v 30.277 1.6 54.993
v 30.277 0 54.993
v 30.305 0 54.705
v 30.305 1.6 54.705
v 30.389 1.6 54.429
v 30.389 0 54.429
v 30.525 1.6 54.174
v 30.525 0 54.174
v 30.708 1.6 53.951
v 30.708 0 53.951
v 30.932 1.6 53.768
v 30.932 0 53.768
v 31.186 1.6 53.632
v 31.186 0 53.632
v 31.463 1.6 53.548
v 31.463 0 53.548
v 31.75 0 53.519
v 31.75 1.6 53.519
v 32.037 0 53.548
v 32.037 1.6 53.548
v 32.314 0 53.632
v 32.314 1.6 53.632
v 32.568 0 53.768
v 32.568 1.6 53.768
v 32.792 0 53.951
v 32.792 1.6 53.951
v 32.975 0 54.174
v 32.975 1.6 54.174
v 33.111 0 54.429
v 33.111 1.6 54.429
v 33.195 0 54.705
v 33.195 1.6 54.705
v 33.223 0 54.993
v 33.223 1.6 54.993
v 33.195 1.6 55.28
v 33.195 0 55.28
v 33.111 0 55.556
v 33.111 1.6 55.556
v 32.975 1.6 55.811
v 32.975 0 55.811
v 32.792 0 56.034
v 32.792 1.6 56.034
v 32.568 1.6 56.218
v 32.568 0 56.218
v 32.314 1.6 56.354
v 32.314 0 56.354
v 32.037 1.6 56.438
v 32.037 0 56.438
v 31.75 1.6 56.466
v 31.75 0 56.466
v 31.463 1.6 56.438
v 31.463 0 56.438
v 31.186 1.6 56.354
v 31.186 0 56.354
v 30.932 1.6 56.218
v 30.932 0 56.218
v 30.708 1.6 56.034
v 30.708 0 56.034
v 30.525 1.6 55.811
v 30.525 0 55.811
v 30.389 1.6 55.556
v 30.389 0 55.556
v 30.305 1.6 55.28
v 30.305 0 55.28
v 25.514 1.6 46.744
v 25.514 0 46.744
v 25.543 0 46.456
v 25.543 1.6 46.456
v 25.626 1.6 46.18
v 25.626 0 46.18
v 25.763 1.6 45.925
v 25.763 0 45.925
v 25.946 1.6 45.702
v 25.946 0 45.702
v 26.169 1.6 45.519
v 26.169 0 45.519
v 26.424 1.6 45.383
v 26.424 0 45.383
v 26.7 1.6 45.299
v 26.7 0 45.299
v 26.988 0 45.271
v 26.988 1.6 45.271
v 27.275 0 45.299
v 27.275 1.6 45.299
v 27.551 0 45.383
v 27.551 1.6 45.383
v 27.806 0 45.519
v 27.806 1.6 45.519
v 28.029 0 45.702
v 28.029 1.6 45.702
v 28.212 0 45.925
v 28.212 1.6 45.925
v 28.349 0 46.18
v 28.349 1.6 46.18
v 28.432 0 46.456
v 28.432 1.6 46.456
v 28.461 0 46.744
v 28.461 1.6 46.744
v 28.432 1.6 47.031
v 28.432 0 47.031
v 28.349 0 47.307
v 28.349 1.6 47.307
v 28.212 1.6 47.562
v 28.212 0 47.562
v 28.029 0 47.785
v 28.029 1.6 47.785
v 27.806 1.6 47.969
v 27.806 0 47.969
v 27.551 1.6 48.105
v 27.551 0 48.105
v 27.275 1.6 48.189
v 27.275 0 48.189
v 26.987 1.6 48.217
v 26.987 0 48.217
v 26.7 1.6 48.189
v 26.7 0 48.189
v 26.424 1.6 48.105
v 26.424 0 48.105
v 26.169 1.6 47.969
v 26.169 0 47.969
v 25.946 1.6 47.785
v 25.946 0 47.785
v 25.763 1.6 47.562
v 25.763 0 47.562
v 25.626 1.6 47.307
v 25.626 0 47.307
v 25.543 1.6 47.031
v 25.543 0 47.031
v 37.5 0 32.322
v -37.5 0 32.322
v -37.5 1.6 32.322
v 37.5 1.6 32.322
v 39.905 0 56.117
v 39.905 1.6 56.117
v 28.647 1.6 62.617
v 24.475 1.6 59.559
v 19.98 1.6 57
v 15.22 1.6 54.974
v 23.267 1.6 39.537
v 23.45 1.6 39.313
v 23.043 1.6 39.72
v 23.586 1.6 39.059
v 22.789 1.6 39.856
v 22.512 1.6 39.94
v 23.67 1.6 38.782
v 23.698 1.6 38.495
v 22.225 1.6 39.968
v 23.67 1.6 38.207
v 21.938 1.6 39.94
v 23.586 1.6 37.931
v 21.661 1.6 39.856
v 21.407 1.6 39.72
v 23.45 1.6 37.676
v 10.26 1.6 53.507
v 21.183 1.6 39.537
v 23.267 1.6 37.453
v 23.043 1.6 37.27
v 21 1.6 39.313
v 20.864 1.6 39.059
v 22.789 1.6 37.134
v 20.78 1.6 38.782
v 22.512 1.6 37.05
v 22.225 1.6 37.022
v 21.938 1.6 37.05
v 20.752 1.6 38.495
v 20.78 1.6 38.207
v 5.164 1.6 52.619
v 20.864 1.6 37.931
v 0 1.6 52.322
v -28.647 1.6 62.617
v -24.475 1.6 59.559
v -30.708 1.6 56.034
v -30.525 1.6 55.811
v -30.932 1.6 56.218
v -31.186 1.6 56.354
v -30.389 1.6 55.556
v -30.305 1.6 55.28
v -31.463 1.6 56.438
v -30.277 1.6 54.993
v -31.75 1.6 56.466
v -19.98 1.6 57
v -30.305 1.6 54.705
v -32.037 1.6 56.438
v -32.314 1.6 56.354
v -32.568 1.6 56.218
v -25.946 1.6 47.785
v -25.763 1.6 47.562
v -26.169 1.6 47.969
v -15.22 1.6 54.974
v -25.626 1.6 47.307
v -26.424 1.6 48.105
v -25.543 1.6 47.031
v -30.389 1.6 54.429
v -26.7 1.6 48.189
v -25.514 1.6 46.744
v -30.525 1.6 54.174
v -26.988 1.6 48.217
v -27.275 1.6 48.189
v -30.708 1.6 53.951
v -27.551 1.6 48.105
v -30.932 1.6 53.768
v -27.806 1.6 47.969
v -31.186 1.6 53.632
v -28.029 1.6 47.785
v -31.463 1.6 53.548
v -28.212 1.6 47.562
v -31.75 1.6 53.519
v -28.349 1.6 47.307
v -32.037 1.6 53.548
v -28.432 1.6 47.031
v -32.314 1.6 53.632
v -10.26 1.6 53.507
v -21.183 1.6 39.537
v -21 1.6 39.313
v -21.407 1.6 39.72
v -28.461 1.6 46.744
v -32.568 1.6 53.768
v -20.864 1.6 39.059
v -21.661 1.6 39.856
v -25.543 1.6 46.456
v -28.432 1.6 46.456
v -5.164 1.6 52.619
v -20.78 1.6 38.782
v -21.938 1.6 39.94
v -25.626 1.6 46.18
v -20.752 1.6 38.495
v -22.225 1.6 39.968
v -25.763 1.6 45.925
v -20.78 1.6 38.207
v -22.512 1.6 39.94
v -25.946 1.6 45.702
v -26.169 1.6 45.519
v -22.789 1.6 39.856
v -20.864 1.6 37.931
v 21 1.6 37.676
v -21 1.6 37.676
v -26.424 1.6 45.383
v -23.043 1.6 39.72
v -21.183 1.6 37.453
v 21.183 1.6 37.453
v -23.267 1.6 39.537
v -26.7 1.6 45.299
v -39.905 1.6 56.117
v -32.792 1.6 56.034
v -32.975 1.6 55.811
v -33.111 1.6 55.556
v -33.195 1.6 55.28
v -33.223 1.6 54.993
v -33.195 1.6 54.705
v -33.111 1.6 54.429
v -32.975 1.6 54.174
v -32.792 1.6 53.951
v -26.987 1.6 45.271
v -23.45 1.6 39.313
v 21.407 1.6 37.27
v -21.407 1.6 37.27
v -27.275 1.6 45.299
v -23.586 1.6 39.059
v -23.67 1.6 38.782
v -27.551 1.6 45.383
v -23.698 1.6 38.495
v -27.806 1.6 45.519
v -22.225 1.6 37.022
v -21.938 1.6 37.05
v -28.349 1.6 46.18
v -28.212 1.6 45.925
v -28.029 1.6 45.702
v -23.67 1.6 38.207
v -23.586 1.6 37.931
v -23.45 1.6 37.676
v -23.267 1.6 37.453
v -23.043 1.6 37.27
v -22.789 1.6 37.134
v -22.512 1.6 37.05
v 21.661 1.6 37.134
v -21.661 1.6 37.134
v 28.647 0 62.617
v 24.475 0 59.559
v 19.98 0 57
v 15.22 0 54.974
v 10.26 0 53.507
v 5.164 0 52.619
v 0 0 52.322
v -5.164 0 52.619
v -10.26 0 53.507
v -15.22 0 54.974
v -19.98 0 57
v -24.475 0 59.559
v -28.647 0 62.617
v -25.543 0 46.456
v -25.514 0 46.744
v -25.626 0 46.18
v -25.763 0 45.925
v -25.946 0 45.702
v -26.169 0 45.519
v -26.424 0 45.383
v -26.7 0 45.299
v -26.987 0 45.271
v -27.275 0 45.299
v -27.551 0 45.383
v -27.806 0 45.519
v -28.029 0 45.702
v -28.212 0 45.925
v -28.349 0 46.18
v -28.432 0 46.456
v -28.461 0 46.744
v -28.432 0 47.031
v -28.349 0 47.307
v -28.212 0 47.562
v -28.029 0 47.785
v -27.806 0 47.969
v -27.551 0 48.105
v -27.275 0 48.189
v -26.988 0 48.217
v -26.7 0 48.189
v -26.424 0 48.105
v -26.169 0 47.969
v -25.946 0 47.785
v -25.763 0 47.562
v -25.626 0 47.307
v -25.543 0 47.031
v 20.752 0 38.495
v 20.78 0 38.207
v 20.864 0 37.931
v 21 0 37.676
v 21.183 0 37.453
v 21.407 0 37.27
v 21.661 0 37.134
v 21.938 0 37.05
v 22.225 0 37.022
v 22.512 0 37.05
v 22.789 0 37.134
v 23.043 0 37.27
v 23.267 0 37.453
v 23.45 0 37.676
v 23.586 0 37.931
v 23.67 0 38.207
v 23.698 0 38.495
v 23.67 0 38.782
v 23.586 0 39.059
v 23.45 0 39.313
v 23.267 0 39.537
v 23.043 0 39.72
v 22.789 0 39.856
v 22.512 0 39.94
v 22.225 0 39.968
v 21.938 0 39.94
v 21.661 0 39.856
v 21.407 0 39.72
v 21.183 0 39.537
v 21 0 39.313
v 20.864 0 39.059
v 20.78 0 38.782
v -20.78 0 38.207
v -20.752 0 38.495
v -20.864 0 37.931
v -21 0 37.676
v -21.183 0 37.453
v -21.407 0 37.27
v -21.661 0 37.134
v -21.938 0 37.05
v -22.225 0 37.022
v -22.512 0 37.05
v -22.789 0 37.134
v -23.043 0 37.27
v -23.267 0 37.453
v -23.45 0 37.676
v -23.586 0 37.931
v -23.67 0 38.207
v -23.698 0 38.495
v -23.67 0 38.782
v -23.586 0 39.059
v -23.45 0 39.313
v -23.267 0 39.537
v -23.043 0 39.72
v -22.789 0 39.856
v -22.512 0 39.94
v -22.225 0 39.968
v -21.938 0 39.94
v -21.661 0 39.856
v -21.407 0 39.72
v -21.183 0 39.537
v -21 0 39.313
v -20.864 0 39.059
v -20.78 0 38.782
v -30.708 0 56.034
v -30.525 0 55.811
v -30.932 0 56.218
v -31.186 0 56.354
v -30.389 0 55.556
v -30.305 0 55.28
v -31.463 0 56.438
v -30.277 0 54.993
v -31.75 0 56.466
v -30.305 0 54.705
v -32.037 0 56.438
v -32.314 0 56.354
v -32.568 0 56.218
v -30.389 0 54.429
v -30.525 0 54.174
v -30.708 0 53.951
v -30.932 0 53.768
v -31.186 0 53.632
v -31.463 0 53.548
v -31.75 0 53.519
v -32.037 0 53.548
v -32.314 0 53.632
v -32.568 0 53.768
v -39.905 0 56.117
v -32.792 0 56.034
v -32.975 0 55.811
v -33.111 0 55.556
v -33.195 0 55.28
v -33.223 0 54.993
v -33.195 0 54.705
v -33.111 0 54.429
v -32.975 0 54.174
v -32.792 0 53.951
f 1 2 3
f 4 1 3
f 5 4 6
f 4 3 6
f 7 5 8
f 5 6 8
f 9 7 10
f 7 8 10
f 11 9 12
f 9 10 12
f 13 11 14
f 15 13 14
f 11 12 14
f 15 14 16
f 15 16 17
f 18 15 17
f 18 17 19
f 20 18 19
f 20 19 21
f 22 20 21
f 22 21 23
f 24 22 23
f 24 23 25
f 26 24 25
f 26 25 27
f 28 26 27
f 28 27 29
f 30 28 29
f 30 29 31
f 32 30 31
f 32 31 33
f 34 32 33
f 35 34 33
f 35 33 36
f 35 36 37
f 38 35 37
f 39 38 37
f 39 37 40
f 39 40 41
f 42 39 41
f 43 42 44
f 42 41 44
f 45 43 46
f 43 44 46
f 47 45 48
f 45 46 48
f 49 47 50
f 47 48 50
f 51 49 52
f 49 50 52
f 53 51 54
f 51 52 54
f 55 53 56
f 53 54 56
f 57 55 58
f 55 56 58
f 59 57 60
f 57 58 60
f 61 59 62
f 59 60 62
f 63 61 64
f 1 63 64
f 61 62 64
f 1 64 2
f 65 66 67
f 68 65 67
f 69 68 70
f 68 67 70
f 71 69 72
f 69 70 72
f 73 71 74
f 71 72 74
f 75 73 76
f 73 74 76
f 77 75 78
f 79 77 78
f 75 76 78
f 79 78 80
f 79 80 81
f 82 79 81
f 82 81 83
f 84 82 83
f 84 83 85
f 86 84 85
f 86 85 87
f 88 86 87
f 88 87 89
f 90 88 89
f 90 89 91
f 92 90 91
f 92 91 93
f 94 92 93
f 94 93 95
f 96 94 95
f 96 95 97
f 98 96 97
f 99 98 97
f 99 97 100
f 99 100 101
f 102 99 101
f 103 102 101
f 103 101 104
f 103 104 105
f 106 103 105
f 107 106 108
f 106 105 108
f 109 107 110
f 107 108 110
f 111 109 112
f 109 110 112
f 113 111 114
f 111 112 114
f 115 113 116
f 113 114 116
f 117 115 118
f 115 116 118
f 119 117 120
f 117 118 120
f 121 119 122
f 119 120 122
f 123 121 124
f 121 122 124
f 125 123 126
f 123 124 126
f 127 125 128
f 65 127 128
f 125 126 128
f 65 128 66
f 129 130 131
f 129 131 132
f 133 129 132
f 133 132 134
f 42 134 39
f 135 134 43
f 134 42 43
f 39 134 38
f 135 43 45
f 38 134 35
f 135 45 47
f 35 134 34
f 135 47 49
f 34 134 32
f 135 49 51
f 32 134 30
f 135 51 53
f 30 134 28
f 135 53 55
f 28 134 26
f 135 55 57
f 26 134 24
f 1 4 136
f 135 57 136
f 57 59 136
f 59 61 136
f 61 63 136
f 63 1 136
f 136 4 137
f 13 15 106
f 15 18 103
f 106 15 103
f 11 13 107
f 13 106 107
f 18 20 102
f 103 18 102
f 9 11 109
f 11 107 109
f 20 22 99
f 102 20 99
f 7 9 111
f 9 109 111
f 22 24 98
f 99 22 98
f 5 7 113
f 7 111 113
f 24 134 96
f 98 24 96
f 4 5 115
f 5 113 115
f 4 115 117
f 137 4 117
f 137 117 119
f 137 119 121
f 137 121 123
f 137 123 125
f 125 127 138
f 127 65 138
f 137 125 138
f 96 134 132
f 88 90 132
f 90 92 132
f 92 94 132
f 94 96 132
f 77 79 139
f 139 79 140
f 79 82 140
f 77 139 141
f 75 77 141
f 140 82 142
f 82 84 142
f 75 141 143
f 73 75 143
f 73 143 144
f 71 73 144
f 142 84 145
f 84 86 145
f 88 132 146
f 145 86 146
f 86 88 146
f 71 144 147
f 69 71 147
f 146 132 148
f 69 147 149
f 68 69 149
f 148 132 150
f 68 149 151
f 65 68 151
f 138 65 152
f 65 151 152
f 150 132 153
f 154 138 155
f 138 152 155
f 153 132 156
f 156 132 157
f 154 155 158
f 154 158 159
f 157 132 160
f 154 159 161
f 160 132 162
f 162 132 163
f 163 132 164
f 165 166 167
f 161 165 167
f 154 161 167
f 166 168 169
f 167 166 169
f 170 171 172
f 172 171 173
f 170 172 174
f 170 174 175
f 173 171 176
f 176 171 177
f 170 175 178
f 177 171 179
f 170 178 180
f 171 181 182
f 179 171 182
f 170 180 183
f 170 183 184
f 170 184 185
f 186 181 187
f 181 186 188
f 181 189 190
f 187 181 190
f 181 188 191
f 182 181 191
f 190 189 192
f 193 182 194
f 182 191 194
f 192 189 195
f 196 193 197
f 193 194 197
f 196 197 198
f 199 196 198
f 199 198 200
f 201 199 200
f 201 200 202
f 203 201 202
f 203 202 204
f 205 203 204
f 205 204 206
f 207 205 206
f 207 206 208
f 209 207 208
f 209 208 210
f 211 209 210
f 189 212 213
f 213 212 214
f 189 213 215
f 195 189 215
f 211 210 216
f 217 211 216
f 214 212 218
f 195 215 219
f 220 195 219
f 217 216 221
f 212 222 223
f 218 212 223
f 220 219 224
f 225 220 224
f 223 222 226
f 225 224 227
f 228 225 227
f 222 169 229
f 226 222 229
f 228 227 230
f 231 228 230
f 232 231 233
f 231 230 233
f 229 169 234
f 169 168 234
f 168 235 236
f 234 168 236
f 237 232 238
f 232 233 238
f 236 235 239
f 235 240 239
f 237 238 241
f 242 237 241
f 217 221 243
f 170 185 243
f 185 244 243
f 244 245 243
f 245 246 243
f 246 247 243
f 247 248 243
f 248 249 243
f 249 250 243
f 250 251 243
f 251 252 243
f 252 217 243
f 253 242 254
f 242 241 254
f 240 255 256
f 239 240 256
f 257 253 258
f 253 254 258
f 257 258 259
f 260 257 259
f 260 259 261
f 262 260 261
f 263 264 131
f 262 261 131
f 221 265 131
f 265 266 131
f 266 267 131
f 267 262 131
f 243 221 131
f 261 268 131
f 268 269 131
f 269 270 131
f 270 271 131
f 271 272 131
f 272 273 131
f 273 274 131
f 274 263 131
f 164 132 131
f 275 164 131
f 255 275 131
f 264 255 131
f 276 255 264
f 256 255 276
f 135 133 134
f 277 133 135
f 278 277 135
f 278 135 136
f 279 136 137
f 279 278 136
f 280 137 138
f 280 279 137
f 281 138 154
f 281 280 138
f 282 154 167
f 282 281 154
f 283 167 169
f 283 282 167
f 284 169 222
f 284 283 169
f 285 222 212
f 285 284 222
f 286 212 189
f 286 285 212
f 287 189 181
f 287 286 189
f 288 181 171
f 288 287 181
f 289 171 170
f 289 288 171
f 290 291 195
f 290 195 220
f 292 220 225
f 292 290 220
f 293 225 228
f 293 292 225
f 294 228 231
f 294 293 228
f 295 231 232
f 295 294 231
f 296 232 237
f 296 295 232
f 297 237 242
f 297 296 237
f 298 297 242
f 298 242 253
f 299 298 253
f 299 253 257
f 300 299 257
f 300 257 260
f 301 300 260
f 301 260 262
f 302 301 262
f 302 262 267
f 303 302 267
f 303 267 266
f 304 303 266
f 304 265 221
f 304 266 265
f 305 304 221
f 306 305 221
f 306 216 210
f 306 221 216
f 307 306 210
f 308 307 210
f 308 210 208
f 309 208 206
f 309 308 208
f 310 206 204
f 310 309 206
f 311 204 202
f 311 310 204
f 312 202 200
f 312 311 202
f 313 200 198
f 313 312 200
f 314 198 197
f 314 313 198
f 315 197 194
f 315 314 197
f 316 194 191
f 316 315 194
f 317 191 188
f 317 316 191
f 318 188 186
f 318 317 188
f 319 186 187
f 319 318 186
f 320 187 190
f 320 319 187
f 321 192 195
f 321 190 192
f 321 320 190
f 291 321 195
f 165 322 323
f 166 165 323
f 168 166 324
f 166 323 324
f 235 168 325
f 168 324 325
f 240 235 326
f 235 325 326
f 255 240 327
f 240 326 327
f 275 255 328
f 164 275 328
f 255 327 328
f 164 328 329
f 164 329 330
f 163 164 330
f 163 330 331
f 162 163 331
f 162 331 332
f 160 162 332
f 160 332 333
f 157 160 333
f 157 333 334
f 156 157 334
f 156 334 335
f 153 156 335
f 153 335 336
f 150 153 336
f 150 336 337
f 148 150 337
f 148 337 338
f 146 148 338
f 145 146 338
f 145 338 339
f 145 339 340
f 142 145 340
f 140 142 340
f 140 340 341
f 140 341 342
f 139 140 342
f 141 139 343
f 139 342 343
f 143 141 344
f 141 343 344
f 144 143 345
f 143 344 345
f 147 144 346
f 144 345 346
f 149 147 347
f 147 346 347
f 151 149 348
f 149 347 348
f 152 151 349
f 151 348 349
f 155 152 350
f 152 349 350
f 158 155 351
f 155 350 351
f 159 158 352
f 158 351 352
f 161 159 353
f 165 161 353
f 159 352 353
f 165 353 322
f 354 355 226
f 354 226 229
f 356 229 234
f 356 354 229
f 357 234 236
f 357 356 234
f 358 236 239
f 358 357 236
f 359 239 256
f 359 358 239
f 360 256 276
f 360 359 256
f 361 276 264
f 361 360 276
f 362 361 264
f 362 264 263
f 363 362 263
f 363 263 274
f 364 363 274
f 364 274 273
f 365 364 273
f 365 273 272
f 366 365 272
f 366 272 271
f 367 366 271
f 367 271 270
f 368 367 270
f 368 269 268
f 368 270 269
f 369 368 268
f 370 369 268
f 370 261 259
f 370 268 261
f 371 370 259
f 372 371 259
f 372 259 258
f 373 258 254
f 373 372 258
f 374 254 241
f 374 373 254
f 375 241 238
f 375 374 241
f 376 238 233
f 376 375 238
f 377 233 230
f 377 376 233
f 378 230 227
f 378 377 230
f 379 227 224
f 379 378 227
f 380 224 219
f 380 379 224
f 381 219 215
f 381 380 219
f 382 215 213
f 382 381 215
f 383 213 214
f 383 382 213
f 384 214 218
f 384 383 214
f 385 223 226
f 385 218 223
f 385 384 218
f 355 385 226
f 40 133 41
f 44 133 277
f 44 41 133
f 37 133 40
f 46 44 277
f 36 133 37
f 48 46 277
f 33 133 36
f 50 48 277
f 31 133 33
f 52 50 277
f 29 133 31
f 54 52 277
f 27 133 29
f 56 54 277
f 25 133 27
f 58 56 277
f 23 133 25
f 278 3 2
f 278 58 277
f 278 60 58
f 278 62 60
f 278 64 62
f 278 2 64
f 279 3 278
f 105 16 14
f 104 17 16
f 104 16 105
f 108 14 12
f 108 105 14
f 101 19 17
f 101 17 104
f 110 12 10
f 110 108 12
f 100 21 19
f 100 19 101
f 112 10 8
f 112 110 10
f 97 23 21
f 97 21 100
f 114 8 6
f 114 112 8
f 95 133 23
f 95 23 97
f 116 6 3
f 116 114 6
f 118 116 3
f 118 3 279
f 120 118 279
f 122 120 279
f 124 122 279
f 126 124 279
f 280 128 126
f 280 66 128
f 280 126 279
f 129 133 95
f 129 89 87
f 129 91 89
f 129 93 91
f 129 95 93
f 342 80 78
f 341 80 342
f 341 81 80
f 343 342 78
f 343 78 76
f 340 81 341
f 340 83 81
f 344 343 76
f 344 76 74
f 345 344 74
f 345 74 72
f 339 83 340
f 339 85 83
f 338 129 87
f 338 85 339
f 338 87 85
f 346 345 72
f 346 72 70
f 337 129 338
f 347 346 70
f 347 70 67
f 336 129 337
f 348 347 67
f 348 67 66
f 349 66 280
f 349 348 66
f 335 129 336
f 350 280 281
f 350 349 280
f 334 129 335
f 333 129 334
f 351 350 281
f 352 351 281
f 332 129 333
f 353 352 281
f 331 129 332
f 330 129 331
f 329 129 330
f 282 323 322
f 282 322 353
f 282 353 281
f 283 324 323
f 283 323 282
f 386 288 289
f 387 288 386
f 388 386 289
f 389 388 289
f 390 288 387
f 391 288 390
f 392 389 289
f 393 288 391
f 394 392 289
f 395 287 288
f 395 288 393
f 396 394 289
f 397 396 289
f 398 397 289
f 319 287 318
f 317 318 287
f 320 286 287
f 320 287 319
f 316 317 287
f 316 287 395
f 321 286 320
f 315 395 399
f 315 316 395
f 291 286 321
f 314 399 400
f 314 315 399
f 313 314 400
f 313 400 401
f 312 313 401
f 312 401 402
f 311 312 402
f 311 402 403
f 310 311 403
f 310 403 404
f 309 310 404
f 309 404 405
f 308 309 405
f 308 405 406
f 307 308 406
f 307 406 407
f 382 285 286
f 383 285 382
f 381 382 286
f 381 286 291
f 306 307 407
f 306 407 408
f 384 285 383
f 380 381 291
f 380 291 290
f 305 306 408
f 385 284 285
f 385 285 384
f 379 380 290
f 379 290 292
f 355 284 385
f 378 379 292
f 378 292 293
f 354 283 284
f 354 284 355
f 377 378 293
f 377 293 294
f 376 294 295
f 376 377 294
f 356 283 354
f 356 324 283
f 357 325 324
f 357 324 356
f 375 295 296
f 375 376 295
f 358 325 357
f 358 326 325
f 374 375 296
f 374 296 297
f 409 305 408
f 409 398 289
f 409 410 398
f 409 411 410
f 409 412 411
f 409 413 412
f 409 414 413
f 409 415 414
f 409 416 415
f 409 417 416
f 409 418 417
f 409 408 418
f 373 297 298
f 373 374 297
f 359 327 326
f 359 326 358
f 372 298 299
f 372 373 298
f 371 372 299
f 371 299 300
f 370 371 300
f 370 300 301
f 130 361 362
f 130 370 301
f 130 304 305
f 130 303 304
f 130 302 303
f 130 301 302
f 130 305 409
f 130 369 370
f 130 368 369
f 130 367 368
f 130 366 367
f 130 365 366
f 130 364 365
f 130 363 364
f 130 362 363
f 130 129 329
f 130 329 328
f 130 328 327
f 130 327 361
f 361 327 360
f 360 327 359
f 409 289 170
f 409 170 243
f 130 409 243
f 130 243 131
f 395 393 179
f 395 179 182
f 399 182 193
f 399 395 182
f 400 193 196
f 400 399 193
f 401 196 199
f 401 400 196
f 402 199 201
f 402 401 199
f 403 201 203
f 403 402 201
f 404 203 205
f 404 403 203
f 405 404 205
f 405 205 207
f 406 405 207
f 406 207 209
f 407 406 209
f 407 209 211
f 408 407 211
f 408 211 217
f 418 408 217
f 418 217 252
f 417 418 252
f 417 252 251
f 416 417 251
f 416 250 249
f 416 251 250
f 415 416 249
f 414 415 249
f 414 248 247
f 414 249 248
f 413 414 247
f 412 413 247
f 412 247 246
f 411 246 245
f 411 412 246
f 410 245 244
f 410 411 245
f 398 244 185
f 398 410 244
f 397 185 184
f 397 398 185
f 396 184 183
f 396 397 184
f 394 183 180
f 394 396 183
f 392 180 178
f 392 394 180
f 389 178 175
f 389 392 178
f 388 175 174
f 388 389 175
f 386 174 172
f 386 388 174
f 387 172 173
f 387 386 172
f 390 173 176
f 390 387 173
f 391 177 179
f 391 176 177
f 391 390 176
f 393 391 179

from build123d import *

# Parameters (mm, degrees)
BOSS_EXTRUDE1_DEPTH   = 1.6
F_4_CLEARANCE_HOLE1_D = 2.9464


with BuildPart() as part:
    # Sketch1 → Boss-Extrude1 (new body)
    with BuildSketch(Plane(origin=(0, 0, 0), x_dir=(1, 0, 0), z_dir=(0, 1, 0))):
        with BuildLine():
            Line((-37.5, -32.3215), (37.5, -32.3215))
            Line((37.5, -32.3215), (39.905002751, -56.11749224))
            Line((39.905002751, -56.11749224), (28.646672501, -62.61749224))
            ThreePointArc((28.646672501, -62.61749224), (0, -52.3215), (-28.646672501, -62.61749224))
            Line((-28.646672501, -62.61749224), (-39.905002751, -56.11749224))
            Line((-39.905002751, -56.11749224), (-37.5, -32.3215))
        make_face()
    extrude(amount=BOSS_EXTRUDE1_DEPTH)

    # #4 Clearance Hole1 (through all)
    with Locations(Plane(origin=(0, 1.6, 0), x_dir=(1, 0, 0), z_dir=(0, 1, 0))):
        with Locations((22.225, -38.494829198), (26.9875, -46.743721169), (31.75, -54.99261314)):
            f_4_clearance_hole1 = Hole(F_4_CLEARANCE_HOLE1_D / 2)

    # Mirror1: #4 Clearance Hole1 across plane
    add(f_4_clearance_hole1.mirror(Plane(origin=(0, 0, 0), x_dir=(0, 0, 1), z_dir=(1, 0, 0))), mode=Mode.SUBTRACT)


solid = part.part
